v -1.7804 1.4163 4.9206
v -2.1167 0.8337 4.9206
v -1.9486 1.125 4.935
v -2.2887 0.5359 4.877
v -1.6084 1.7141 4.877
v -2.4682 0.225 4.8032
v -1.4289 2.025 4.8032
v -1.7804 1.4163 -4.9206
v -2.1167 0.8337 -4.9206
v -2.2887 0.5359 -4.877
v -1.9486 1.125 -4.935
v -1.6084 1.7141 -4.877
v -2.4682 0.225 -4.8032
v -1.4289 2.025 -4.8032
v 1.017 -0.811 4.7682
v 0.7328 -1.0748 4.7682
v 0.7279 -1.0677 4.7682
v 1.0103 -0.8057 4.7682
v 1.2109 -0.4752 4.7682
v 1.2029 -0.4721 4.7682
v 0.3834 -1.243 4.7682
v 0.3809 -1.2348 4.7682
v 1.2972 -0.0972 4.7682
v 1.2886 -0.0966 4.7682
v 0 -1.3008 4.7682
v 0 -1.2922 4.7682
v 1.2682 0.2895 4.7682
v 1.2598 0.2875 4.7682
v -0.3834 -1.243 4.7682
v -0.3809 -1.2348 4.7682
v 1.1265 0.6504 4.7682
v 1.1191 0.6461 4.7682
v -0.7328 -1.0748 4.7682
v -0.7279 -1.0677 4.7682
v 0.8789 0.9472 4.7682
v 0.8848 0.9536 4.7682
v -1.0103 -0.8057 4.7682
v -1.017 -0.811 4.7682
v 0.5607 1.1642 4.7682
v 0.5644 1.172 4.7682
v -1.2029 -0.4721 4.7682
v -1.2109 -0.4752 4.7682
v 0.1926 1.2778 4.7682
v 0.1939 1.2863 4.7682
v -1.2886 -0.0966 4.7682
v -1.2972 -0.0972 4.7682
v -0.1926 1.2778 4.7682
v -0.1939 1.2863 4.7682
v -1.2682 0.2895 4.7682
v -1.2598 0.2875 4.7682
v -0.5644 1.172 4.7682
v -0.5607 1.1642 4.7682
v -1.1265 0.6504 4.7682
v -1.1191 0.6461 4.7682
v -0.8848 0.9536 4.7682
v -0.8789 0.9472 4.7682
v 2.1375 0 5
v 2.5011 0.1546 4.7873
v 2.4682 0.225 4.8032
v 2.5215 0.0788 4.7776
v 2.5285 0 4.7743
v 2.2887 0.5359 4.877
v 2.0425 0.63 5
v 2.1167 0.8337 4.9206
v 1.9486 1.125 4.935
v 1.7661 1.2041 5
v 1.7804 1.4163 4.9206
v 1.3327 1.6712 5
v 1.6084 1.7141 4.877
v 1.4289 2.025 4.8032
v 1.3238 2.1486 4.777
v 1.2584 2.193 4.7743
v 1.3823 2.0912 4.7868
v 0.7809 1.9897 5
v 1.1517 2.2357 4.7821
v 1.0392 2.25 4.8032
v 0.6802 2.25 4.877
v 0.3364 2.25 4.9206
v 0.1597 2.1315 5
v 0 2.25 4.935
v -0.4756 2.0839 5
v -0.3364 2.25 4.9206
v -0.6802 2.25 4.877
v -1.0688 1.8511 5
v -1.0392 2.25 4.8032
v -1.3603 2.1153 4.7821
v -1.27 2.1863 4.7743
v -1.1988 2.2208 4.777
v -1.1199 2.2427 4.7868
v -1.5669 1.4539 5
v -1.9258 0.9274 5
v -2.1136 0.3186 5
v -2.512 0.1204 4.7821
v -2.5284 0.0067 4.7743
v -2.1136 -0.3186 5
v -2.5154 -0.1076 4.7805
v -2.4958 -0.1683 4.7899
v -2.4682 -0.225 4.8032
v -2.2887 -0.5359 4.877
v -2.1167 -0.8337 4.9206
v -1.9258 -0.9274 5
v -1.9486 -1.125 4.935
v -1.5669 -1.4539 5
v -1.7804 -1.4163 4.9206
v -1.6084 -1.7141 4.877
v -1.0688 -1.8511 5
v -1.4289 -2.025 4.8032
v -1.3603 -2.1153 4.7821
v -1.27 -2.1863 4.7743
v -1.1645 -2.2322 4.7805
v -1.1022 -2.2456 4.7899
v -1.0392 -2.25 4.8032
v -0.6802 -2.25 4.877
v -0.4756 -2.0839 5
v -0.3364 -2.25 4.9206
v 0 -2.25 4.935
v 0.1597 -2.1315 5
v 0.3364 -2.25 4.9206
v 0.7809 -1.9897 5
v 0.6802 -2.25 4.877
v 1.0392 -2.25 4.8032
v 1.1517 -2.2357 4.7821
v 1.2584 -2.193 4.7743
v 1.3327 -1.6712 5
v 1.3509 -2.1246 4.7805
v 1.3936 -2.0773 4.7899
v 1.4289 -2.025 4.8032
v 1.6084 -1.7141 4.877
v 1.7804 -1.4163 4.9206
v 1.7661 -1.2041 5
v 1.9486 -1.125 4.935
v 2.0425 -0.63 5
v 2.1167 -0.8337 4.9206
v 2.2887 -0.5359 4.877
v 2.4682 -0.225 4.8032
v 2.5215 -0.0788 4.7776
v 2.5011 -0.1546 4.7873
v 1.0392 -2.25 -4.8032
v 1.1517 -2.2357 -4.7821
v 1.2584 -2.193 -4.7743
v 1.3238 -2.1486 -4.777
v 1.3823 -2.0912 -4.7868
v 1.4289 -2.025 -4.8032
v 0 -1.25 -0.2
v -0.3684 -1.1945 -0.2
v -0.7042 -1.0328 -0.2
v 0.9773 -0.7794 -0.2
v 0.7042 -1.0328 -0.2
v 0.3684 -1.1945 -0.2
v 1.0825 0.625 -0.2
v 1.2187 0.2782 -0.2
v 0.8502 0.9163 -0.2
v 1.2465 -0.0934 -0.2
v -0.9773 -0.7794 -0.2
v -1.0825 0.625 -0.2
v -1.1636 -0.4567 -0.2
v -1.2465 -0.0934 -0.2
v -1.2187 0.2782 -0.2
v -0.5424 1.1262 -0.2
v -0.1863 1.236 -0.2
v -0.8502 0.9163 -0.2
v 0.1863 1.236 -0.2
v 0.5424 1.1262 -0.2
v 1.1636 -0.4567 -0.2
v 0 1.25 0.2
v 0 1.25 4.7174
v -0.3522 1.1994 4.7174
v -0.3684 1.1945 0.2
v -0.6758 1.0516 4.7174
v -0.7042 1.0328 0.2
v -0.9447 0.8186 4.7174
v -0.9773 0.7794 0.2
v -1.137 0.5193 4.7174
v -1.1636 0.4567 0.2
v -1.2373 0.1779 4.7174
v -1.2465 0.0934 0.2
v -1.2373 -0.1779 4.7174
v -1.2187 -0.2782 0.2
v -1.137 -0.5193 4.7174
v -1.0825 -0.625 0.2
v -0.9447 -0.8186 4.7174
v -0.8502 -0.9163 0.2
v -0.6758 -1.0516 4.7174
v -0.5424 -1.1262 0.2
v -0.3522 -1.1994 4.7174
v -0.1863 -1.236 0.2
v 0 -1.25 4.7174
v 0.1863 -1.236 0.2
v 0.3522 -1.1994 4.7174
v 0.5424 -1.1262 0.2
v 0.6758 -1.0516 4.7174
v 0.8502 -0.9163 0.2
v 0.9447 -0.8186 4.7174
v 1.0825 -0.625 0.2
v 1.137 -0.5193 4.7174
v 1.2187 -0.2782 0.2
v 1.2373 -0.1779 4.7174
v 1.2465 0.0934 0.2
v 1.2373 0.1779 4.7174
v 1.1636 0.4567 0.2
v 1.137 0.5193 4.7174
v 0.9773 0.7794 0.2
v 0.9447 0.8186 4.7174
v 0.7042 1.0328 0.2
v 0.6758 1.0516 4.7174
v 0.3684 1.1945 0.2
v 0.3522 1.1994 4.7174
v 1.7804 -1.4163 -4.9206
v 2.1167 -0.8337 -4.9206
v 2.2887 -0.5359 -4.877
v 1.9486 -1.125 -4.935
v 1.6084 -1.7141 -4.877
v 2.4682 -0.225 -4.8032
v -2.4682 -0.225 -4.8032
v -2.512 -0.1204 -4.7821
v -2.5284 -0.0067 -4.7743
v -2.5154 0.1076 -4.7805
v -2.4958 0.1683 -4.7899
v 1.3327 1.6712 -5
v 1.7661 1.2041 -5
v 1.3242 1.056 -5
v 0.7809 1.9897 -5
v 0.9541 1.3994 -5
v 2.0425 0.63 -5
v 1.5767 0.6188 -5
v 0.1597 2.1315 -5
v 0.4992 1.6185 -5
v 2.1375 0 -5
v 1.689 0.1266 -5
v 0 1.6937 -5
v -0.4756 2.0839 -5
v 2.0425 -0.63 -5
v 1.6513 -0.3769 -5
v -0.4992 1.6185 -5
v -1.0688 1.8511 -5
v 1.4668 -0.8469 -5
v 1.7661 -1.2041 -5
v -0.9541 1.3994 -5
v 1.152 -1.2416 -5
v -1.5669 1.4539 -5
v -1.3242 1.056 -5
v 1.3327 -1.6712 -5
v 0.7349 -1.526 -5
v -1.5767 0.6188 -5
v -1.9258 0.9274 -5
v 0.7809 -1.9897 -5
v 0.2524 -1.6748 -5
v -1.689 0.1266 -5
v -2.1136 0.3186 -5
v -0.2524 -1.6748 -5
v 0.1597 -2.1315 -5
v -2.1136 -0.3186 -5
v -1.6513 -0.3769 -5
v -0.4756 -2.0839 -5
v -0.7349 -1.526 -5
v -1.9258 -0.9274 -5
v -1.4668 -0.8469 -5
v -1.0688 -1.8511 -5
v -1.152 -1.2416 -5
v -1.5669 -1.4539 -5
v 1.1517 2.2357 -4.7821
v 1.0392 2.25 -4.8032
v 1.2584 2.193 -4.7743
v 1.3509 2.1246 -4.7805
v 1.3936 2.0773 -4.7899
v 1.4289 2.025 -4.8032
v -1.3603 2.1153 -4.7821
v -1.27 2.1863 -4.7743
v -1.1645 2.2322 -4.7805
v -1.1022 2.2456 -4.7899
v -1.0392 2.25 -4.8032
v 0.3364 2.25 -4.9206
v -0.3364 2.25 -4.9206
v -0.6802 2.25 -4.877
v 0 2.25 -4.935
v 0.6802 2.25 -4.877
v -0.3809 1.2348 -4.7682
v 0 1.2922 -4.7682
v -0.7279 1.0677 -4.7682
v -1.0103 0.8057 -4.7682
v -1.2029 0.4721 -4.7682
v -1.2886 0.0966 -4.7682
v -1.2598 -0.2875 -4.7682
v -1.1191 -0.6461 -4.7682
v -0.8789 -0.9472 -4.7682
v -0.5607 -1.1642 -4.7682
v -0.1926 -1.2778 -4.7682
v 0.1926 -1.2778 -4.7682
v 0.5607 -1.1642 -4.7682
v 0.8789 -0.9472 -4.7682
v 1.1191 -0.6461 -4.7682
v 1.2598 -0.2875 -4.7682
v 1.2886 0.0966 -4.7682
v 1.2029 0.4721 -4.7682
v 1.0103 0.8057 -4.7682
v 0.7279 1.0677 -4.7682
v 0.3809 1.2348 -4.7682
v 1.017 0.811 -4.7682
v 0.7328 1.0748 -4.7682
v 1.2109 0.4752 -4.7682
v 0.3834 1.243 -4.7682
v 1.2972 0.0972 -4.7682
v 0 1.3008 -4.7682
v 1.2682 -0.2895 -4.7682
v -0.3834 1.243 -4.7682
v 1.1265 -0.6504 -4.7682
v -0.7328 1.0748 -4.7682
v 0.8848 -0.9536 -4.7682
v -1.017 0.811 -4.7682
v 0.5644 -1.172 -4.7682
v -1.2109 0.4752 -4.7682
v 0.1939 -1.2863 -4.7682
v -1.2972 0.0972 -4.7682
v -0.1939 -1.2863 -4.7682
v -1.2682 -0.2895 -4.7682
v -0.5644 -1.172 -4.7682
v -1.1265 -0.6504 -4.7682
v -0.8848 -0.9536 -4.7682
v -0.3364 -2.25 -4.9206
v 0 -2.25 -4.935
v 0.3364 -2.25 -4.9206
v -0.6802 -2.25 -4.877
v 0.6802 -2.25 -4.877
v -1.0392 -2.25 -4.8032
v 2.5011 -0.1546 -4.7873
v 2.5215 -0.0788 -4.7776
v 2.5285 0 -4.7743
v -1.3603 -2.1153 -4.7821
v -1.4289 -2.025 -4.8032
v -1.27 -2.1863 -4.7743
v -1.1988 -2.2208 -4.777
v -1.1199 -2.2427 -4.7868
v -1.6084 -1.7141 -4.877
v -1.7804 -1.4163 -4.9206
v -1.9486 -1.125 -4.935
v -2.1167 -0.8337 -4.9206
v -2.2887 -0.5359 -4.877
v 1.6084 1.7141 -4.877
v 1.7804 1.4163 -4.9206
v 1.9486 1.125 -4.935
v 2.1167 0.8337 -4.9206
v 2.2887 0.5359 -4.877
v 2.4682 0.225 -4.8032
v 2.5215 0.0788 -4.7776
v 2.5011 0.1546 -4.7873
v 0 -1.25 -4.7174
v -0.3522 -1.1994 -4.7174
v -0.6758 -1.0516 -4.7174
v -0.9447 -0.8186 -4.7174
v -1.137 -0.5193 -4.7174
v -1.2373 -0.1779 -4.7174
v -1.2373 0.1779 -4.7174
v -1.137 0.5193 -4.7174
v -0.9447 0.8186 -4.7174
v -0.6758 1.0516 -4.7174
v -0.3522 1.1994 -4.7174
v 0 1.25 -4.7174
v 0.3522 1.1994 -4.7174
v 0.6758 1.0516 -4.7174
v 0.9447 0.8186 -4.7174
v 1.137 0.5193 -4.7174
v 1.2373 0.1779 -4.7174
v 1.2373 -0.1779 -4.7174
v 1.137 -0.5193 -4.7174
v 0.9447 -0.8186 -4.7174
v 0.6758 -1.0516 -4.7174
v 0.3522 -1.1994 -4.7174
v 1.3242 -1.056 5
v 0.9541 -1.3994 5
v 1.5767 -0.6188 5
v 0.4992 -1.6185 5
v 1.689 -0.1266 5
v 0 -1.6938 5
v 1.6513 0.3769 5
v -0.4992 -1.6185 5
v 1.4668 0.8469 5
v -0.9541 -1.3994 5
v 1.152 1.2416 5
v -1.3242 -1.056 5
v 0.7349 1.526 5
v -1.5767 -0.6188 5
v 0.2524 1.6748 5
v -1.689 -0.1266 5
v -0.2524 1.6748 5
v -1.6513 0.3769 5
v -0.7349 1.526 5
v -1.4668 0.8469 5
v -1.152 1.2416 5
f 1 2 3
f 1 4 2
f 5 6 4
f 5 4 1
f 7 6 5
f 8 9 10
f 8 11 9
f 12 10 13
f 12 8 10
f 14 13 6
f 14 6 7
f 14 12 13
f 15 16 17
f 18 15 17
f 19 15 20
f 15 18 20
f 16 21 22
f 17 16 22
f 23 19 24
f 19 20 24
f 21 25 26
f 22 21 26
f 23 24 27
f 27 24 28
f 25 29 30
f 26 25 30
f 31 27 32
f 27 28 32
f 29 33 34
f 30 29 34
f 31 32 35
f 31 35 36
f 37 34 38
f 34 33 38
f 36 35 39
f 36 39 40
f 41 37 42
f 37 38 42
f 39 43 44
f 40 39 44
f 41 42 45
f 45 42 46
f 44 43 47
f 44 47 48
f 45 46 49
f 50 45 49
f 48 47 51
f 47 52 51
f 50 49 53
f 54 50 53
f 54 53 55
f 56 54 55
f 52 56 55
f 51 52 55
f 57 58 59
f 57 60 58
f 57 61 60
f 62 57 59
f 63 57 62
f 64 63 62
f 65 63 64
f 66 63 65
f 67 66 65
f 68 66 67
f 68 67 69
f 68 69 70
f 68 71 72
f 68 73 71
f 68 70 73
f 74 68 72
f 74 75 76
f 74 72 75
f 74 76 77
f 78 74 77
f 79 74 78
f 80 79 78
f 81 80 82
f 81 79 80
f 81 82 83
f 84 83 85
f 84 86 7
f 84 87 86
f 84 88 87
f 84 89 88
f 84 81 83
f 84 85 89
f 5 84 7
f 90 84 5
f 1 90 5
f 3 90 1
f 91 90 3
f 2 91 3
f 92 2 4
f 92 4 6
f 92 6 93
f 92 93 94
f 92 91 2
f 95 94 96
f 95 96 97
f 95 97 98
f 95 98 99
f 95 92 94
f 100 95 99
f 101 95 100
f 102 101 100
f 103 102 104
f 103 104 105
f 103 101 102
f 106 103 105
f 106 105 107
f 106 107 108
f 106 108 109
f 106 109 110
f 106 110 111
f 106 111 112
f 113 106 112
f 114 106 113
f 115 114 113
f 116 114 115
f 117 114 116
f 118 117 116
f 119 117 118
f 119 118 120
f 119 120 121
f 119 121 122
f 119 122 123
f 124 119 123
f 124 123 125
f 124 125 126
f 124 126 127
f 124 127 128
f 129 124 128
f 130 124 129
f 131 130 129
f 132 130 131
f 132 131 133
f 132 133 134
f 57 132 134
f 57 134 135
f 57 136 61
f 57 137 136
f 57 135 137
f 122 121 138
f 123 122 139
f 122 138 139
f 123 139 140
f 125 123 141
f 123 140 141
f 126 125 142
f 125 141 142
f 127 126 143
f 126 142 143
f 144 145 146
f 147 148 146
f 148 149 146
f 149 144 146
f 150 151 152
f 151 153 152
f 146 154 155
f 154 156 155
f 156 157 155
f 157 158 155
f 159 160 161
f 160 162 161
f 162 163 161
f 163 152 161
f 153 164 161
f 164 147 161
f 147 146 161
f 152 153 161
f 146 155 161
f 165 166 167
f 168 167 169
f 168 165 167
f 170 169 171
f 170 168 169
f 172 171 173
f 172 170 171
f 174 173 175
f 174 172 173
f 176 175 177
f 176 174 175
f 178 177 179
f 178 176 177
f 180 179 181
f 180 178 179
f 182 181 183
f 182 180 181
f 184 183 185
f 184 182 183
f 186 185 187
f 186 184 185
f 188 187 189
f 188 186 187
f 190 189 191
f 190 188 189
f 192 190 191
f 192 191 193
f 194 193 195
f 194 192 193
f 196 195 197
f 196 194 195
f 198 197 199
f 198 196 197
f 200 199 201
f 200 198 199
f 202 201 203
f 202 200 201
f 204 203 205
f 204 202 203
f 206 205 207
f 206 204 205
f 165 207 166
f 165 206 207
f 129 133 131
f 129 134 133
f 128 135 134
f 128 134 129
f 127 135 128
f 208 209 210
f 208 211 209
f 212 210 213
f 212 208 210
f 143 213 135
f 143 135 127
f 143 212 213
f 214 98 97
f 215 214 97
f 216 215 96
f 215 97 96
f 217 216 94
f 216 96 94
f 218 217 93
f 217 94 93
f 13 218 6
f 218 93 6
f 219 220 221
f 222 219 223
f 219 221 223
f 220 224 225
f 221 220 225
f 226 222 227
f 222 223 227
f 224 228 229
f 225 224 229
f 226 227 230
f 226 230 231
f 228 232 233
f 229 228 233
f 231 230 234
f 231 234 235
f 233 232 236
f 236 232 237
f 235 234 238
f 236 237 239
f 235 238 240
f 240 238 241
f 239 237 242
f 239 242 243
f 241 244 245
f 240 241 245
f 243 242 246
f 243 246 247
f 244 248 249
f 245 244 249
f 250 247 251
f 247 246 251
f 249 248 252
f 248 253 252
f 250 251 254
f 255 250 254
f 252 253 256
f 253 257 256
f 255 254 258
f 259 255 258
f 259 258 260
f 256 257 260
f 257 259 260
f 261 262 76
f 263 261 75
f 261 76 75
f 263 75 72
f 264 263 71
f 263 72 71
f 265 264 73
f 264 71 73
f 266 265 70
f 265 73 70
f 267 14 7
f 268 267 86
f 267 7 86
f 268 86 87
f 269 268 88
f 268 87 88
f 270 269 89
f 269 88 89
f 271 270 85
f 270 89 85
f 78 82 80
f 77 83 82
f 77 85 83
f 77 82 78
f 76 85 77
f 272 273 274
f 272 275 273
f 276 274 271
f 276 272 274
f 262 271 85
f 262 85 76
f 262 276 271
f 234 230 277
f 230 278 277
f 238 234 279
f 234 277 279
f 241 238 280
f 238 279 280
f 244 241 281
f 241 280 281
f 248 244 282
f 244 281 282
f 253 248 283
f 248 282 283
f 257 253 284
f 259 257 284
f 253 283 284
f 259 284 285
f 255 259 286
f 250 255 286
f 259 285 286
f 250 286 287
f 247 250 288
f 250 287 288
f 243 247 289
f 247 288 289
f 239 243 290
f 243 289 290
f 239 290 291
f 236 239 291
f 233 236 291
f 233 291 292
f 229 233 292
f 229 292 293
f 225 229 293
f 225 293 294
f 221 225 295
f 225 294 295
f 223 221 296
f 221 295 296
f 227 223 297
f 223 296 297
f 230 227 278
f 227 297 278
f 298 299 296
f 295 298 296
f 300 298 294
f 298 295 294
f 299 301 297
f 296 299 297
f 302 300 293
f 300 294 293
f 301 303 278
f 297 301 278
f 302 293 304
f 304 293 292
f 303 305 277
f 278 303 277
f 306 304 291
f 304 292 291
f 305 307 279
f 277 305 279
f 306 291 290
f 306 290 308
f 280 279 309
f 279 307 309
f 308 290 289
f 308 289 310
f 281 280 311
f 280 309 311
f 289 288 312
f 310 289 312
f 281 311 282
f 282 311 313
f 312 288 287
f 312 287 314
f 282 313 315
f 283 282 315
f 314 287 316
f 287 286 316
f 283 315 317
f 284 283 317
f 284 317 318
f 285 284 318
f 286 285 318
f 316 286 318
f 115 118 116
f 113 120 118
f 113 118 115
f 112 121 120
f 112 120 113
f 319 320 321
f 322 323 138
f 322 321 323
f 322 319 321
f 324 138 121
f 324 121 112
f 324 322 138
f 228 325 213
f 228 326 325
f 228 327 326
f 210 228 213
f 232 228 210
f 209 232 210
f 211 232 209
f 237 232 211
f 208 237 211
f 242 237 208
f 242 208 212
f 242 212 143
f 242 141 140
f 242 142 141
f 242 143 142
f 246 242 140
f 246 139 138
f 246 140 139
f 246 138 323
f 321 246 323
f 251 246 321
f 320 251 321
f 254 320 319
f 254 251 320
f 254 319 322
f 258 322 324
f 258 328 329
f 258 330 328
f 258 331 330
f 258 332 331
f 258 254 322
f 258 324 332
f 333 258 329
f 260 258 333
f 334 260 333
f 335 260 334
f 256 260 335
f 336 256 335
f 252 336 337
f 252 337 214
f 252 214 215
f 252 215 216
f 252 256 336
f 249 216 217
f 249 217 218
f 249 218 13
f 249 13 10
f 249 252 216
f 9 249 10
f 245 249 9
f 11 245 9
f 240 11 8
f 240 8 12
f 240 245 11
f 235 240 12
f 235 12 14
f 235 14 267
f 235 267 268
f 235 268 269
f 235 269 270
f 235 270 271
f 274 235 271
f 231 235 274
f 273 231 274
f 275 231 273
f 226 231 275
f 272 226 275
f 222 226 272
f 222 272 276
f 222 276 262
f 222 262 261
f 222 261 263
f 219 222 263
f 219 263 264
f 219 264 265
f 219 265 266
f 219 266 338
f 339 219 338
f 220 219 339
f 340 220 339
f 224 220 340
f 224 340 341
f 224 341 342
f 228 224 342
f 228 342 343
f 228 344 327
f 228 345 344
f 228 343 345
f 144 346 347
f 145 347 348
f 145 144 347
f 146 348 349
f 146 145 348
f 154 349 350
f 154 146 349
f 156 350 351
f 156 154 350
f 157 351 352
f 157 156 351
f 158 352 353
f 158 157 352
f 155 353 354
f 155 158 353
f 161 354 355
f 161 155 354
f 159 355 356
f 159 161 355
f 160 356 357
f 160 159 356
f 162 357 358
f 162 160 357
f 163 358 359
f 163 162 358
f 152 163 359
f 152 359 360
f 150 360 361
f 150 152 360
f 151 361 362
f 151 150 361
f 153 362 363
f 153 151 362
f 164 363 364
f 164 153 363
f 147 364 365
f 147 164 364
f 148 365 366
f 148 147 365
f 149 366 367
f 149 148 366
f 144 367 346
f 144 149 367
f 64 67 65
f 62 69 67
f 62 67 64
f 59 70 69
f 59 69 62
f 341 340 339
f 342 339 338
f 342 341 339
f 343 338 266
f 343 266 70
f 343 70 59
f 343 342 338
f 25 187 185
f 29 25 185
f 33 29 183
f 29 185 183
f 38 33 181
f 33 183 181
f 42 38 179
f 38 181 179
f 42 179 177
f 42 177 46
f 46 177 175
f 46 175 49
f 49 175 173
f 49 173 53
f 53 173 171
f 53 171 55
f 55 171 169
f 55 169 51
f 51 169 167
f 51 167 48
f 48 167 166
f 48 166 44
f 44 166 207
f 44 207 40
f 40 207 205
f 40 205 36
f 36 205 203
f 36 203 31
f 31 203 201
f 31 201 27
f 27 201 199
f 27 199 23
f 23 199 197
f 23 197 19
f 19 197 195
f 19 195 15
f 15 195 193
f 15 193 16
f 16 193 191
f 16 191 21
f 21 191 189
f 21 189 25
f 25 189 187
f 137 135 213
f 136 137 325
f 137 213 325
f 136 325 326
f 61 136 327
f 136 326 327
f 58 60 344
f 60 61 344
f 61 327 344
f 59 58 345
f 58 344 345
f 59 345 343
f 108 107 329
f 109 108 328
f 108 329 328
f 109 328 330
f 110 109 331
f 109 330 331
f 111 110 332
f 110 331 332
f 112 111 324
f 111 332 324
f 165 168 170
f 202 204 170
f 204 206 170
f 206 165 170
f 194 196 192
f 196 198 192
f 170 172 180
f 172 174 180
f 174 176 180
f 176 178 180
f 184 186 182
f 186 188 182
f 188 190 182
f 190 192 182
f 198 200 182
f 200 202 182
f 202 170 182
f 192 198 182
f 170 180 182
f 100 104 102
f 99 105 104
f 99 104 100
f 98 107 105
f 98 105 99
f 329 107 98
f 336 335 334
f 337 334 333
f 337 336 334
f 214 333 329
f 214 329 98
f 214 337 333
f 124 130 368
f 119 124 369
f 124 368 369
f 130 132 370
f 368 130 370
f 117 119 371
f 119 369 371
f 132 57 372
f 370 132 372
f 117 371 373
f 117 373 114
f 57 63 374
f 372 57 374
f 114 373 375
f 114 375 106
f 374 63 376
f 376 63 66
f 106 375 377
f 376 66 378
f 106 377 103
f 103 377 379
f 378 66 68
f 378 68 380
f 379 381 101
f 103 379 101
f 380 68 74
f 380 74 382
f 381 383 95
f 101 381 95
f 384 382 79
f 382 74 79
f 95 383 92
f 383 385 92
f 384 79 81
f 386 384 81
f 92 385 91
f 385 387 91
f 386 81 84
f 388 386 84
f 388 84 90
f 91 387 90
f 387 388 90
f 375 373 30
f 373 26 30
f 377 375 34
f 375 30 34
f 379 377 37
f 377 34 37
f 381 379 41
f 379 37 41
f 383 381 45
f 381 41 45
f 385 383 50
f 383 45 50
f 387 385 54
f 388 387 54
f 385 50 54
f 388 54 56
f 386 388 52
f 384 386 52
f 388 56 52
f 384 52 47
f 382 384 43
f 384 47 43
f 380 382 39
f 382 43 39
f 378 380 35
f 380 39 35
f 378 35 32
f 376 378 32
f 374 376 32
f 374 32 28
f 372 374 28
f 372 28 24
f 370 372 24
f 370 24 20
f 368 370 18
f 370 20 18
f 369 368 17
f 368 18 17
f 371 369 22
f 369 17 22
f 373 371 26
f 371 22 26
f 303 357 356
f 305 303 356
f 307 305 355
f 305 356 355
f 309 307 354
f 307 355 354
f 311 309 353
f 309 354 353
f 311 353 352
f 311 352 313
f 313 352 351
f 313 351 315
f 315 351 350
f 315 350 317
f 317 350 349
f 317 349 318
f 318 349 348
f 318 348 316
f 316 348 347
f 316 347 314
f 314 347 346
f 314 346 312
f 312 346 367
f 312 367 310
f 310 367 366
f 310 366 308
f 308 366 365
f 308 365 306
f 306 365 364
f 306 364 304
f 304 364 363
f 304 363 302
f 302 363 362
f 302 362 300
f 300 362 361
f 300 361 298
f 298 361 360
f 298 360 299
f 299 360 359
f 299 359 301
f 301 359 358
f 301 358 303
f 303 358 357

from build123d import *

# Parameters (mm, degrees)
SKETCH4_R           = 1.75
BOSS_EXTRUDE1_DEPTH = 5
SKETCH5_OUTSIDE_W   = 49.716
SKETCH5_OUTSIDE_H   = 49.02
SKETCH5_OUTSIDE_R   = 2.1375
CUT_EXTRUDE1_DEPTH  = 11.574142991
CUT_EXTRUDE1_DRAFT  = -60
SKETCH6_OUTSIDE_W   = 49.716
SKETCH6_OUTSIDE_H   = 49.02
SKETCH6_OUTSIDE_R   = 2.1375
CUT_EXTRUDE2_DEPTH  = 11.574142991
CUT_EXTRUDE2_DRAFT  = -60
FILLET1_R           = 0.45
BOSS_EXTRUDE2_START = -5
SKETCH7_R           = 1.69375
BOSS_EXTRUDE2_DEPTH = 4.8
SKETCH8_W           = 4.8
SKETCH8_H           = 1.25
CIRPATTERN1_COUNT   = 2


with BuildPart() as part:
    # Sketch3 → Revolve1 (revolve)
    with BuildSketch(Plane(origin=(0, 0, 0), x_dir=(0, 0, -1), z_dir=(1, 0, 0))):
        Polygon((-4.743800818, 1.25), (-0.2, 1.25), (-0.2, 0), (0.2, 0), (0.2, 1.25), (4.743800818, 1.25), (5, 1.69375), (5, 2.25), (0, 2.25), (-5, 2.25), (-5, 1.69375), align=None)
        Polygon((-4.743800818, 1.25), (-0.2, 1.25), (-0.2, 0), (0.2, 0), (0.2, 1.25), (4.743800818, 1.25), (5, 1.69375), (5, 2.25), (0, 2.25), (-5, 2.25), (-5, 1.69375), align=None)
    revolve(axis=Axis((0, 0, 0.2), (0, 0, 1)))

    # Sketch4 → Boss-Extrude1 (add, symmetric)
    with BuildSketch(Plane.XY):
        Polygon((-1.299038106, 2.25), (-2.598076211, 0), (-1.299038106, -2.25), (1.299038106, -2.25), (2.598076211, 0), (1.299038106, 2.25), align=None)
        Circle(SKETCH4_R, mode=Mode.SUBTRACT)
    extrude(amount=BOSS_EXTRUDE1_DEPTH, both=True)


with BuildPart() as cut_extrude1_tool:
    # Sketch5 outside → Cut-Extrude1 (with draft: the straight prism first)
    with BuildSketch(Plane.XY.offset(5)):
        Rectangle(SKETCH5_OUTSIDE_W, SKETCH5_OUTSIDE_H)
        Circle(SKETCH5_OUTSIDE_R, mode=Mode.SUBTRACT)
    extrude(amount=-CUT_EXTRUDE1_DEPTH)
    # Cut-Extrude1: the draft: its side faces are tilted about the plane it starts from
    cut_extrude1_sides = [cut_extrude1_tool.faces().sort_by_distance(p)[0] for p in [
        (0, -24.51, -0.787071496),
        (24.858, 0, -0.787071496),
        (0, 24.51, -0.787071496),
        (-24.858, 0, -0.787071496),
        (-2.1375, 0, -0.787071496),
    ]]
    draft(cut_extrude1_sides, Plane.XY.offset(5), CUT_EXTRUDE1_DRAFT)


with BuildPart() as part_1:
    add(part.part)

    # Cut-Extrude1: cut by cut_extrude1_tool
    add(cut_extrude1_tool.part, mode=Mode.SUBTRACT)


with BuildPart() as cut_extrude2_tool:
    # Sketch6 outside → Cut-Extrude2 (with draft: the straight prism first)
    with BuildSketch(Plane(origin=(0, 0, -5), x_dir=(-1, 0, 0), z_dir=(0, 0, -1))):
        Rectangle(SKETCH6_OUTSIDE_W, SKETCH6_OUTSIDE_H)
        Circle(SKETCH6_OUTSIDE_R, mode=Mode.SUBTRACT)
    extrude(amount=-CUT_EXTRUDE2_DEPTH)
    # Cut-Extrude2: the draft: its side faces are tilted about the plane it starts from
    cut_extrude2_sides = [cut_extrude2_tool.faces().sort_by_distance(p)[0] for p in [
        (0, -24.51, 0.787071496),
        (-24.858, 0, 0.787071496),
        (0, 24.51, 0.787071496),
        (24.858, 0, 0.787071496),
        (2.1375, 0, 0.787071496),
    ]]
    draft(cut_extrude2_sides, Plane(origin=(0, 0, -5), x_dir=(-1, 0, 0), z_dir=(0, 0, -1)), CUT_EXTRUDE2_DRAFT)


with BuildPart() as part_2:
    add(part_1.part)

    # Cut-Extrude2: cut by cut_extrude2_tool
    add(cut_extrude2_tool.part, mode=Mode.SUBTRACT)

    # Fillet1
    # the kernel refuses this fillet: 0.45 mm, written as the material it takes off along each edge
    with BuildSketch(Plane(origin=(1.299038106, 2.25, 5.383605253), x_dir=(-1, 0, 0), z_dir=(0, 0, -1)), Plane(origin=(-1.299038106, 2.25, 5.383605253), x_dir=(-0.49999999999999967, -0.8660254037844387, 0), z_dir=(0, 0, -1))) as fillet1_piece_1:
        with BuildLine():
            CenterArc((FILLET1_R * 0.57735026919, -FILLET1_R), FILLET1_R, 90, 60)
            Line((-FILLET1_R * 0.288675134595, -FILLET1_R * 0.5), (0, 0))
            Line((0, 0), (FILLET1_R * 0.57735026919, 0))
        make_face()
    extrude(amount=10.767210506, mode=Mode.SUBTRACT)
    with BuildSketch(Plane(origin=(-2.598076211, 0, -5.383605253), x_dir=(0.5000000000000006, -0.8660254037844384, 0), z_dir=(0, 0, 1)), Plane(origin=(-1.299038106, -2.25, -5.383605253), x_dir=(1, 0, 0), z_dir=(0, 0, 1)), Plane(origin=(1.299038106, -2.25, -5.383605253), x_dir=(0.49999999999999967, 0.8660254037844387, 0), z_dir=(0, 0, 1)), Plane(origin=(2.598076211, 0, 5.383605253), x_dir=(-0.5, -0.8660254037844388, 0), z_dir=(0, 0, -1))) as fillet1_piece_2:
        with BuildLine():
            CenterArc((FILLET1_R * 0.57735026919, FILLET1_R), FILLET1_R, 210, 60)
            Line((-FILLET1_R * 0.288675134595, FILLET1_R * 0.5), (0, 0))
            Line((0, 0), (FILLET1_R * 0.57735026919, 0))
        make_face()
    extrude(amount=10.767210506, mode=Mode.SUBTRACT)

    # Sketch7 → Boss-Extrude2 (add)
    with BuildSketch(Plane(origin=(0, 0, 0), x_dir=(-1, 0, 0), z_dir=(0, 0, -1)).offset(BOSS_EXTRUDE2_START)):
        Circle(SKETCH7_R)
    extrude(amount=BOSS_EXTRUDE2_DEPTH)

    # SurfaceCut1
    split(bisect_by=Plane.XY, keep=Keep.TOP)


with BuildPart() as body_2:
    # Sketch8 → Revolve2 (revolve)
    with BuildSketch(Plane(origin=(0, 0, 0), x_dir=(0, 0, -1), z_dir=(1, 0, 0))):
        with Locations((-2.6, 0.625)):
            Rectangle(SKETCH8_W, SKETCH8_H)
    revolve(axis=Axis((0, 0, 0.2), (0, 0, 1)))


with BuildPart() as part_3:
    add(part_2.part)

    # Combine1: cut body 2
    add(body_2.part, mode=Mode.SUBTRACT)

    # Cut-Extrude3 cone 1 section (through the dimple's axis) → Cut-Extrude3 (revolve, cut)
    with BuildSketch(Plane(origin=(0, 0, 5), x_dir=(0, -1, 0), z_dir=(1, 0, 0))):
        Polygon((0, 0), (1.69375, 0), (0, 0.977887018), align=None)
    revolve(axis=Axis((0, 0, 5), (0, 0, -1)), mode=Mode.SUBTRACT)

    # Cut-Extrude4 cone 1 section (through the dimple's axis) → Cut-Extrude4 (revolve, cut)
    with BuildSketch(Plane(origin=(0, 0, 4.768157783), x_dir=(0, -1, 0), z_dir=(1, 0, 0))):
        Polygon((0, 0), (1.3008, 0), (0, 1.3008), align=None)
    revolve(axis=Axis((0, 0, 4.768157783), (0, 0, -1)), mode=Mode.SUBTRACT)


with BuildPart() as cirpattern1_1:
    # CirPattern1: pattern copy
    add(part_3.part.rotate(Axis((0, 0, 0), (1, 0, 0)), 1 * 360 / CIRPATTERN1_COUNT))


with BuildPart() as part_4:
    add(part_3.part)

    # Combine2: union CirPattern1_1
    add(cirpattern1_1.part)


solid = part_4.part
